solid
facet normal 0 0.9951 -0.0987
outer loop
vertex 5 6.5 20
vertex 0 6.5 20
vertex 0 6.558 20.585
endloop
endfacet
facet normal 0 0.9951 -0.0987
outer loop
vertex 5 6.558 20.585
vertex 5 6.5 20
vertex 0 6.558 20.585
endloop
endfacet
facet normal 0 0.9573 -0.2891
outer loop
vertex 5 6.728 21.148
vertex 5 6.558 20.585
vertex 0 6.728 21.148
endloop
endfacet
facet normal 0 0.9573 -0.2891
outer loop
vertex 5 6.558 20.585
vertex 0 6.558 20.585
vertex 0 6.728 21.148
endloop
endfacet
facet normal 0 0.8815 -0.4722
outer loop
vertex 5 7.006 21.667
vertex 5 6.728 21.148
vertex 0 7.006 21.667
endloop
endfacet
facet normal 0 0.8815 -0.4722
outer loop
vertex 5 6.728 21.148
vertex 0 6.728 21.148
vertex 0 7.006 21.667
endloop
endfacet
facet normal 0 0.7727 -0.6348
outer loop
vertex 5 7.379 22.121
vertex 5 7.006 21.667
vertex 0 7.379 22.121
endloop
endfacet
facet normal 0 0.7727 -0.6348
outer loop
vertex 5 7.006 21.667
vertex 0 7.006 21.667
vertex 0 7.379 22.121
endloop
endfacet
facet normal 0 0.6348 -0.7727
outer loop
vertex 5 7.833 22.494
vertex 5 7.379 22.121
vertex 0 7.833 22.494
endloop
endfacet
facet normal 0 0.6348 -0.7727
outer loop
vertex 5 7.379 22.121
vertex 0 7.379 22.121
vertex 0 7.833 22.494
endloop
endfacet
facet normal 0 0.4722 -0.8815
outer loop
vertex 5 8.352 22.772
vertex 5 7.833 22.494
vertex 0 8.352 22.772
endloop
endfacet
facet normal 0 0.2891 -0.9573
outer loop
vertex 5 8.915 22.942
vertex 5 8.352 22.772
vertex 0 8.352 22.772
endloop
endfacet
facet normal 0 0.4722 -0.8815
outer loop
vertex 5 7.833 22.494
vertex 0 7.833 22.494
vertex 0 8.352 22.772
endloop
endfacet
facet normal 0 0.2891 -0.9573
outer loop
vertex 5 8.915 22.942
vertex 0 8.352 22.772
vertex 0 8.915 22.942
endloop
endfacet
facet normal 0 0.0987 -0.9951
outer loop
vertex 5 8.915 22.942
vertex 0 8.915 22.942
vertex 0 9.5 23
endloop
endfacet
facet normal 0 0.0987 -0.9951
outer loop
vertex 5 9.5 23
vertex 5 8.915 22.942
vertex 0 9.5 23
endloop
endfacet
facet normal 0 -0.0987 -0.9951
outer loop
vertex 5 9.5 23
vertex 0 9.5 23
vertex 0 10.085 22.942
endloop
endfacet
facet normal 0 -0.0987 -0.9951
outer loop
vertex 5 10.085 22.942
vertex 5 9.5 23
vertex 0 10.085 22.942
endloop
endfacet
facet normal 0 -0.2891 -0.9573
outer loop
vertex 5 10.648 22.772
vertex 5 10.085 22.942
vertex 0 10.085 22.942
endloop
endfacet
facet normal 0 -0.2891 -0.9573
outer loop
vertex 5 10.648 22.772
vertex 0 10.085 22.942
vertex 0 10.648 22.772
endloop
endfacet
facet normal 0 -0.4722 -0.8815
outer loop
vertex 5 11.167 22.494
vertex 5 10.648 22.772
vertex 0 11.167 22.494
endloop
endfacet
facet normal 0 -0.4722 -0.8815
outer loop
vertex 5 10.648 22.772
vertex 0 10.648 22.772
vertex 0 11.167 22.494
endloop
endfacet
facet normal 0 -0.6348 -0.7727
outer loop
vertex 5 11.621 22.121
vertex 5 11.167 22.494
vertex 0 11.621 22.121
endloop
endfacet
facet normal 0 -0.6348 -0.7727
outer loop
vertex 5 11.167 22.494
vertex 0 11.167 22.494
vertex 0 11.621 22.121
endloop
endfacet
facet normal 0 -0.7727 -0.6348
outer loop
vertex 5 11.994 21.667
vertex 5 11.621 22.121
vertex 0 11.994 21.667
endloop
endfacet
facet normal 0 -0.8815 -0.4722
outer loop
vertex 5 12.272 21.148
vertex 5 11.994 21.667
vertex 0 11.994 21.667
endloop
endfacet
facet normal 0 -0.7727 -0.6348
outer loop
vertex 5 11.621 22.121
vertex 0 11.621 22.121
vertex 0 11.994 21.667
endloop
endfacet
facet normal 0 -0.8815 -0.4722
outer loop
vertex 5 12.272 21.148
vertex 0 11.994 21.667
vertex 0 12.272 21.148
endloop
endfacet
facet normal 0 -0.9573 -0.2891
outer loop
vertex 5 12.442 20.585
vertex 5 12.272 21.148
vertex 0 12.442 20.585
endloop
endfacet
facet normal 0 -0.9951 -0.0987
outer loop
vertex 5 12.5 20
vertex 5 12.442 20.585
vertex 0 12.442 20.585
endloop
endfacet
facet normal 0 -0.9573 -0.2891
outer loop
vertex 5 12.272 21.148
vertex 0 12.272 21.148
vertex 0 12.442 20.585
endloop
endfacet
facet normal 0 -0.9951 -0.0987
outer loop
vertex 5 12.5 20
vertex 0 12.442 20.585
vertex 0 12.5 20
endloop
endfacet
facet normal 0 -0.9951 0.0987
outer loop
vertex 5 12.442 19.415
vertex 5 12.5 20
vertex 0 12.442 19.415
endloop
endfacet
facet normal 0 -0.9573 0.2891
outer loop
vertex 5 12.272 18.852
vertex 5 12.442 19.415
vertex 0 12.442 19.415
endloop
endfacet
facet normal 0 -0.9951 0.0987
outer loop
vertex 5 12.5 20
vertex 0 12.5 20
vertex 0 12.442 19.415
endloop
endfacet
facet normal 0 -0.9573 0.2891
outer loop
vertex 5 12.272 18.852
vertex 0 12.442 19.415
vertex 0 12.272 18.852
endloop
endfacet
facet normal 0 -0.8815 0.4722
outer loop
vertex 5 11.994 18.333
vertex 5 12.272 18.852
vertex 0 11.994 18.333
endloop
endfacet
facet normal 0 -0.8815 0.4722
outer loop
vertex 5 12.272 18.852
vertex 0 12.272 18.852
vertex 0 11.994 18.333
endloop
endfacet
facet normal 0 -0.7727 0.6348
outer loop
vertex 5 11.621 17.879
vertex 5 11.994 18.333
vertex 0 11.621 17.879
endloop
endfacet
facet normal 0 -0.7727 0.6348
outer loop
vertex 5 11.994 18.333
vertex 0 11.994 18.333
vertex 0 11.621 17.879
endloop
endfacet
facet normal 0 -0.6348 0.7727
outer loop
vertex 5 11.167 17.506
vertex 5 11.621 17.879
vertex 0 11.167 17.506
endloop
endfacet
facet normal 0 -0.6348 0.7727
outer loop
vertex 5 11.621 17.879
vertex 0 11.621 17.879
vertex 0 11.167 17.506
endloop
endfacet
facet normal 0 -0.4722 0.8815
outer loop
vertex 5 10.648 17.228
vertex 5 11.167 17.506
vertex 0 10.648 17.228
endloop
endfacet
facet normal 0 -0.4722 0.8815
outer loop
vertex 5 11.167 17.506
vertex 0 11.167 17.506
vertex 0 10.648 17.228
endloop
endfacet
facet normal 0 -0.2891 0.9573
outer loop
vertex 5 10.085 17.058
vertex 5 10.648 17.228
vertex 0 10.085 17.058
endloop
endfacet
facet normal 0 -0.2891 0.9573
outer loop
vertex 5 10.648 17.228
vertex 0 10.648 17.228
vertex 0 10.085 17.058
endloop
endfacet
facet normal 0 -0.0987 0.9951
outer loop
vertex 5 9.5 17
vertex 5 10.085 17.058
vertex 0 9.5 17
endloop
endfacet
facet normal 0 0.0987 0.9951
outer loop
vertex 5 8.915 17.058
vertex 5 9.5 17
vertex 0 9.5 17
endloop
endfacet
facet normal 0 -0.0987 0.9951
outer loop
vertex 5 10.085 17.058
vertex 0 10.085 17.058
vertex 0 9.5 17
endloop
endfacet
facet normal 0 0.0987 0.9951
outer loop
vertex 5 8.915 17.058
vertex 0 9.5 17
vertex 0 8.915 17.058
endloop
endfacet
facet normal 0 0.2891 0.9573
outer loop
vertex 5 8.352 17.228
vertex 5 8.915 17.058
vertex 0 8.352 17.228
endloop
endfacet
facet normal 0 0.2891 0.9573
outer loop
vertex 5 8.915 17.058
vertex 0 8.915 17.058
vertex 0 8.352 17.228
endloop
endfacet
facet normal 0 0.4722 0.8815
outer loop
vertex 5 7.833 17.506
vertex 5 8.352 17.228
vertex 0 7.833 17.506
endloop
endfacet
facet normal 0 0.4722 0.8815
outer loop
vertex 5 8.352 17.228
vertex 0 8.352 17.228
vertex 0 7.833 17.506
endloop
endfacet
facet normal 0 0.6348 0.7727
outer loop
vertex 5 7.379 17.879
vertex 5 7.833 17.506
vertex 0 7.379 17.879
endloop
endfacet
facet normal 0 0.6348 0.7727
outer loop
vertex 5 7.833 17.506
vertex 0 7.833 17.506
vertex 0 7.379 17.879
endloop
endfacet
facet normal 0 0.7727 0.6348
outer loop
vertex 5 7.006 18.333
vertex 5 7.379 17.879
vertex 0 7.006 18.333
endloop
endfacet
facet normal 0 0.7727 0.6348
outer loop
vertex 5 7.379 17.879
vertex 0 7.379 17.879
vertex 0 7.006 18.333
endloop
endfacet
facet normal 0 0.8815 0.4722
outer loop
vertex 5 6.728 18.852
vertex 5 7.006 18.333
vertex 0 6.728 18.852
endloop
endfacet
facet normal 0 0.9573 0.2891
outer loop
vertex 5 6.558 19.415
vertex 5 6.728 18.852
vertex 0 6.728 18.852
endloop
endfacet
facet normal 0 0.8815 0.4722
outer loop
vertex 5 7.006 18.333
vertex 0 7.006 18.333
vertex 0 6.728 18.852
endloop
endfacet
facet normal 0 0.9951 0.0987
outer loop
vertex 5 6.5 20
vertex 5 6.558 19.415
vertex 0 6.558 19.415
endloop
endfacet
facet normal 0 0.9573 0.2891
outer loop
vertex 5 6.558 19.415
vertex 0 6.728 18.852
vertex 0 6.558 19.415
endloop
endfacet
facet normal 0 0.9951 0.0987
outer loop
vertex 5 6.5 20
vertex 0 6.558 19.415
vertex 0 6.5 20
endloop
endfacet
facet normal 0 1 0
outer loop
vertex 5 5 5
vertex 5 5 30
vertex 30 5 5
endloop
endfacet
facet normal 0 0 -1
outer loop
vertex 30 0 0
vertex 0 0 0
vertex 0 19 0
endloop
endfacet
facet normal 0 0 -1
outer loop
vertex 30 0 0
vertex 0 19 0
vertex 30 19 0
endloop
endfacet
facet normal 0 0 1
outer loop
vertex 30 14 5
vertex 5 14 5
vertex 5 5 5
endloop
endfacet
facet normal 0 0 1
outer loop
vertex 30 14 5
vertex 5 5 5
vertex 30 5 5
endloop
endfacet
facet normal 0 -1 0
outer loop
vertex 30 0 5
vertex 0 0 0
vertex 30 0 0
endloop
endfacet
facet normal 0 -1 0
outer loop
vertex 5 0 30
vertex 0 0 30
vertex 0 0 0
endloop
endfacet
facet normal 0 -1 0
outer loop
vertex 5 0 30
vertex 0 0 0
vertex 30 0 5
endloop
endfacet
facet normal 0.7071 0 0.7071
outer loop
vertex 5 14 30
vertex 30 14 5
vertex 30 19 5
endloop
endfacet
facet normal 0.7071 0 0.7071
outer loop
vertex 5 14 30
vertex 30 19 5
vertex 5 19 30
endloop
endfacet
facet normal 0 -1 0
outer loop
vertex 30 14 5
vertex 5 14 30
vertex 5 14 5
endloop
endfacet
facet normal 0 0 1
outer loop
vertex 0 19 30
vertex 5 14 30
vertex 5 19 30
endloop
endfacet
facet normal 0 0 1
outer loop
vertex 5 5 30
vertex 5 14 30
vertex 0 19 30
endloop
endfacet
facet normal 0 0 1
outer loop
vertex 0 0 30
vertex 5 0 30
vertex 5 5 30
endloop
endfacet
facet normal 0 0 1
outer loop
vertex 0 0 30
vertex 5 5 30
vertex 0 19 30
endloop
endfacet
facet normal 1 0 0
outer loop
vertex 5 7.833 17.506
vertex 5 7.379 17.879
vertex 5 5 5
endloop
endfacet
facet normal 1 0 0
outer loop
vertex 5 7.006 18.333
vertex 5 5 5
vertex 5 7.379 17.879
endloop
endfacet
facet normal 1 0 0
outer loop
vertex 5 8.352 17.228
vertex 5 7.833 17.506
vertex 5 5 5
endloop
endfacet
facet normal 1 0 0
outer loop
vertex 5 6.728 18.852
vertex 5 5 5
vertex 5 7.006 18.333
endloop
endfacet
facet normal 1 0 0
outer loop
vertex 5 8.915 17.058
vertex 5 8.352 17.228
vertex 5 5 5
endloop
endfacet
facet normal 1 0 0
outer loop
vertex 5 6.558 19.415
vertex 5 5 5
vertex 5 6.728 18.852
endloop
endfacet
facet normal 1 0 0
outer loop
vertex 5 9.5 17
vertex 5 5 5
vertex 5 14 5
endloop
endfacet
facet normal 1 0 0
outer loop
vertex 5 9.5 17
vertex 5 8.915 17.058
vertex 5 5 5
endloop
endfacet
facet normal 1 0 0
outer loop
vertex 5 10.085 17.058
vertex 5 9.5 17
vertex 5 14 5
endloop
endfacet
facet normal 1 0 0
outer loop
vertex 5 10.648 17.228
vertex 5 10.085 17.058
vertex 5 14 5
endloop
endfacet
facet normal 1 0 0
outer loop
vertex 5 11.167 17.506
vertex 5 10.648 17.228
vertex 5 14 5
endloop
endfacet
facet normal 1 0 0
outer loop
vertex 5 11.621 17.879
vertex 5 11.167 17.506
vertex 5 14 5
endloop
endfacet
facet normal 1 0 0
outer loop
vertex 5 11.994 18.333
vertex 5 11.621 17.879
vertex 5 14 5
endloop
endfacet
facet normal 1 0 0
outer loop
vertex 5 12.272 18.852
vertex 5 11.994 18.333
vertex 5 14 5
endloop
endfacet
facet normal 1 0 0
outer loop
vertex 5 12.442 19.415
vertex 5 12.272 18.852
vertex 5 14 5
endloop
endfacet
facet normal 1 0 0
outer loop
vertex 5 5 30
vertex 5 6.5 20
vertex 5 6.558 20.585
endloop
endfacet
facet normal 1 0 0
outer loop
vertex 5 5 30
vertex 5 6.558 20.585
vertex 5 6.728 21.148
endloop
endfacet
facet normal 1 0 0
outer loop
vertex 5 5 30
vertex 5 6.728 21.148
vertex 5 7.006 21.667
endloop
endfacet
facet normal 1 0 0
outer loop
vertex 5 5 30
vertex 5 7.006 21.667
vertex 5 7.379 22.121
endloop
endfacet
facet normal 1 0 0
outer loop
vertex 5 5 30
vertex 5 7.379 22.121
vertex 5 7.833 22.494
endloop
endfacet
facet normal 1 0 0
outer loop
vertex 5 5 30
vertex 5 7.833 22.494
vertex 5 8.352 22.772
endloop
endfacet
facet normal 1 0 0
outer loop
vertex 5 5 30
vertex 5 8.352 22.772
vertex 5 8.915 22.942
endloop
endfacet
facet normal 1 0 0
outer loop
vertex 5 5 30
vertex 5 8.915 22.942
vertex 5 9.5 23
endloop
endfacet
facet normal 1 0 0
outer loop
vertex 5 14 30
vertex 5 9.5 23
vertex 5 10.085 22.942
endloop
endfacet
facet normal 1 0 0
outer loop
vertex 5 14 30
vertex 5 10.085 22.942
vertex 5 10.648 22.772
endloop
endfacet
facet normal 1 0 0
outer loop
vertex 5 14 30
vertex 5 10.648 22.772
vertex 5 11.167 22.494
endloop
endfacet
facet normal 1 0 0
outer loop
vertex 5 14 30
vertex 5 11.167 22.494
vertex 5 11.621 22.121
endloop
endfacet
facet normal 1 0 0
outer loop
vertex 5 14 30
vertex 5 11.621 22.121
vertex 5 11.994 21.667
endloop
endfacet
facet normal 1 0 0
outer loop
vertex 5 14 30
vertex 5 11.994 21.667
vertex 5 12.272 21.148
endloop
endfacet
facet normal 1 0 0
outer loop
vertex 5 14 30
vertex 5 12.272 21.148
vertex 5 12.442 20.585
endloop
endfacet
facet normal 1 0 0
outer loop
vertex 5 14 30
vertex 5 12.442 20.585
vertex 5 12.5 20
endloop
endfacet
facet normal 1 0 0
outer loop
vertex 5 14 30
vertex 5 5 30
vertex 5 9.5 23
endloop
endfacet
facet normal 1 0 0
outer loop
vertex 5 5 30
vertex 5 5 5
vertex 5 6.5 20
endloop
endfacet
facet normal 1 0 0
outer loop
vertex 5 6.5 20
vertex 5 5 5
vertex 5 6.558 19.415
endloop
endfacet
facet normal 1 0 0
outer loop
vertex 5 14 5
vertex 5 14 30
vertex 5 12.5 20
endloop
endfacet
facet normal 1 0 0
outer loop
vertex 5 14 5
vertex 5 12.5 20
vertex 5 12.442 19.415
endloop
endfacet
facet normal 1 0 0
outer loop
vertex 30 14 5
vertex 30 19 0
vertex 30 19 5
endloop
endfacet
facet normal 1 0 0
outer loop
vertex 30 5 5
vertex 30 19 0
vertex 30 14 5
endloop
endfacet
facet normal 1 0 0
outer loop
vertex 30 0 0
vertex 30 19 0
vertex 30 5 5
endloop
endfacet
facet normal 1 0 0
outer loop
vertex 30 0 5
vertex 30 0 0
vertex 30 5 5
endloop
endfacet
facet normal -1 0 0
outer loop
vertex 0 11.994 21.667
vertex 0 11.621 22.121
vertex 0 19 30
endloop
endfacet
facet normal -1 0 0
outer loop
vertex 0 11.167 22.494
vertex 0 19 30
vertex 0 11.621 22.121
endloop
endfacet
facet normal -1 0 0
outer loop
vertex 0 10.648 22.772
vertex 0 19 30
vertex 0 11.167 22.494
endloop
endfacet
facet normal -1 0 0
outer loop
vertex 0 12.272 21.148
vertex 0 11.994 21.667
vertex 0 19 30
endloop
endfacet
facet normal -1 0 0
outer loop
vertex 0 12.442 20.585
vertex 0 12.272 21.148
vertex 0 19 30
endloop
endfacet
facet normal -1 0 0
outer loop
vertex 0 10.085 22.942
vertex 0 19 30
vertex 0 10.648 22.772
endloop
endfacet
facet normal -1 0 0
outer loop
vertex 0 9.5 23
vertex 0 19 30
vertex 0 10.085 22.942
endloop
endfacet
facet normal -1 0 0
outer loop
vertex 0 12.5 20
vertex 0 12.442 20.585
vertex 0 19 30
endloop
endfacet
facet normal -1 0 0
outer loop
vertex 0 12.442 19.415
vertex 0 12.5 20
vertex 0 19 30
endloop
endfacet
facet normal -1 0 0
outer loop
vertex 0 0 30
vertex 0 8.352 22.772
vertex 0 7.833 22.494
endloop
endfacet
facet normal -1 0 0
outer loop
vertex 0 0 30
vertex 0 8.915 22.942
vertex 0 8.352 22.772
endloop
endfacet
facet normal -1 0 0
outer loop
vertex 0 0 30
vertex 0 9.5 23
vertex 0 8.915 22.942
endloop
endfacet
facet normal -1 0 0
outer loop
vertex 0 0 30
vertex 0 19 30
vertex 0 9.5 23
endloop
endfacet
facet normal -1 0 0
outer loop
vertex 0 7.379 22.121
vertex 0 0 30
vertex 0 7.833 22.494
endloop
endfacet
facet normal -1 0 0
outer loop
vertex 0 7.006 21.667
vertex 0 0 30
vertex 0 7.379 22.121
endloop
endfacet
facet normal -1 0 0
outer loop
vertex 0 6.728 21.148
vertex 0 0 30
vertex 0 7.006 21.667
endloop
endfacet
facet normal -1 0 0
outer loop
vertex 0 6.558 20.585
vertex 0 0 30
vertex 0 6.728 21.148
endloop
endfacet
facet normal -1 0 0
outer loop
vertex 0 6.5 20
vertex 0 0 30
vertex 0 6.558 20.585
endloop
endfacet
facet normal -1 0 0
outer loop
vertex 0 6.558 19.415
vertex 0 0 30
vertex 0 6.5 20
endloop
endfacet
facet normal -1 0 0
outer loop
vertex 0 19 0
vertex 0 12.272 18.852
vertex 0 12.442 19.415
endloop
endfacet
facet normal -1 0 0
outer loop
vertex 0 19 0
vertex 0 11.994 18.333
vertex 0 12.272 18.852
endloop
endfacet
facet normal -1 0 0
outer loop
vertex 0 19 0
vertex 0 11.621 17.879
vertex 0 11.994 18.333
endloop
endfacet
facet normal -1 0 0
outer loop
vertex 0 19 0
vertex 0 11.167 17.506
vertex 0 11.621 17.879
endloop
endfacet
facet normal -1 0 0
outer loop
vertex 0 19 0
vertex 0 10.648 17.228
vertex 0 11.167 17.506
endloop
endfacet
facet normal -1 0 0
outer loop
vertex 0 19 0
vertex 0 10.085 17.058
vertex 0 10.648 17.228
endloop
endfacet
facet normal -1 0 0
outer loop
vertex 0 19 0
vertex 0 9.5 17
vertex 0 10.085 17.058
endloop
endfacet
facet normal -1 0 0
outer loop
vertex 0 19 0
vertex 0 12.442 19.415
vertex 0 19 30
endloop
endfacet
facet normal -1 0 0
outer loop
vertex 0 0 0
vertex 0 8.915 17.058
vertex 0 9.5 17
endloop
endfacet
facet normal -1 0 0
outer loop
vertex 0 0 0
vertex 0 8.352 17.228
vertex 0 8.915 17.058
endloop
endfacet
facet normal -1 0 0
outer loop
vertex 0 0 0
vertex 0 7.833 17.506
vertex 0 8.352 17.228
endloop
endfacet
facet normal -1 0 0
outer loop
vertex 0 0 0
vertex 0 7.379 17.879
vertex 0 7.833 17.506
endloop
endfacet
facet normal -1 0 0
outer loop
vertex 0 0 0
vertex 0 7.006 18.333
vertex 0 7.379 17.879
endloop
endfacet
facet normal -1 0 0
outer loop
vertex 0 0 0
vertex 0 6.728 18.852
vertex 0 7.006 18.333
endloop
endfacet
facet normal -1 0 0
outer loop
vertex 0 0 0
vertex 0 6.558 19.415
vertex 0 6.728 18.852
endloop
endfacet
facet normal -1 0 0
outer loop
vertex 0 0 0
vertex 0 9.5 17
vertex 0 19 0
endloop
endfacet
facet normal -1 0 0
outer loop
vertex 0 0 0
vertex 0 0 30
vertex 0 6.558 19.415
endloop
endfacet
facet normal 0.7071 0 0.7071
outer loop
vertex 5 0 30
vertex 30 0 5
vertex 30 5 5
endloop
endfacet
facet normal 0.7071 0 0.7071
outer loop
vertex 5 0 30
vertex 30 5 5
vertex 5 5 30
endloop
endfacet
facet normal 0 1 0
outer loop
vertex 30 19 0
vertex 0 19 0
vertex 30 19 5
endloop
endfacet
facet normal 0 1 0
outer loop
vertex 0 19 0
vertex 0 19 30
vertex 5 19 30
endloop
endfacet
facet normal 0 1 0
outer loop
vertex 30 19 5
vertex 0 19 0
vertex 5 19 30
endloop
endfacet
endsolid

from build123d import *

# Parameters (mm, degrees)
F1_DEPTH = 19
F3_W     = 25
F3_H     = 9
F4_DEPTH = 25
F5_R     = 3
F6_DEPTH = 5


with BuildPart() as f1:
    # F0 (on Front) → F1 (new body)
    with BuildSketch(Plane.XZ):
        Polygon((0, 30), (0, 0), (30, 0), (30, 5), (5, 30), align=None)
    extrude(amount=-F1_DEPTH)

    # F3 (on offset) → F4 (cut)
    with BuildSketch(Plane.XY.offset(30)):
        with Locations((17.5, 9.5)):
            Rectangle(F3_W, F3_H)
    extrude(amount=-F4_DEPTH, mode=Mode.SUBTRACT)

    # F5 (on face) → F6 (cut, through all)
    with BuildSketch(Plane(origin=(0, 0, 0), x_dir=(0, -1, 0), z_dir=(-1, 0, 0))):
        with Locations((-9.5, 20)):
            Circle(F5_R)
    extrude(amount=-F6_DEPTH, mode=Mode.SUBTRACT)


solid = f1.part
